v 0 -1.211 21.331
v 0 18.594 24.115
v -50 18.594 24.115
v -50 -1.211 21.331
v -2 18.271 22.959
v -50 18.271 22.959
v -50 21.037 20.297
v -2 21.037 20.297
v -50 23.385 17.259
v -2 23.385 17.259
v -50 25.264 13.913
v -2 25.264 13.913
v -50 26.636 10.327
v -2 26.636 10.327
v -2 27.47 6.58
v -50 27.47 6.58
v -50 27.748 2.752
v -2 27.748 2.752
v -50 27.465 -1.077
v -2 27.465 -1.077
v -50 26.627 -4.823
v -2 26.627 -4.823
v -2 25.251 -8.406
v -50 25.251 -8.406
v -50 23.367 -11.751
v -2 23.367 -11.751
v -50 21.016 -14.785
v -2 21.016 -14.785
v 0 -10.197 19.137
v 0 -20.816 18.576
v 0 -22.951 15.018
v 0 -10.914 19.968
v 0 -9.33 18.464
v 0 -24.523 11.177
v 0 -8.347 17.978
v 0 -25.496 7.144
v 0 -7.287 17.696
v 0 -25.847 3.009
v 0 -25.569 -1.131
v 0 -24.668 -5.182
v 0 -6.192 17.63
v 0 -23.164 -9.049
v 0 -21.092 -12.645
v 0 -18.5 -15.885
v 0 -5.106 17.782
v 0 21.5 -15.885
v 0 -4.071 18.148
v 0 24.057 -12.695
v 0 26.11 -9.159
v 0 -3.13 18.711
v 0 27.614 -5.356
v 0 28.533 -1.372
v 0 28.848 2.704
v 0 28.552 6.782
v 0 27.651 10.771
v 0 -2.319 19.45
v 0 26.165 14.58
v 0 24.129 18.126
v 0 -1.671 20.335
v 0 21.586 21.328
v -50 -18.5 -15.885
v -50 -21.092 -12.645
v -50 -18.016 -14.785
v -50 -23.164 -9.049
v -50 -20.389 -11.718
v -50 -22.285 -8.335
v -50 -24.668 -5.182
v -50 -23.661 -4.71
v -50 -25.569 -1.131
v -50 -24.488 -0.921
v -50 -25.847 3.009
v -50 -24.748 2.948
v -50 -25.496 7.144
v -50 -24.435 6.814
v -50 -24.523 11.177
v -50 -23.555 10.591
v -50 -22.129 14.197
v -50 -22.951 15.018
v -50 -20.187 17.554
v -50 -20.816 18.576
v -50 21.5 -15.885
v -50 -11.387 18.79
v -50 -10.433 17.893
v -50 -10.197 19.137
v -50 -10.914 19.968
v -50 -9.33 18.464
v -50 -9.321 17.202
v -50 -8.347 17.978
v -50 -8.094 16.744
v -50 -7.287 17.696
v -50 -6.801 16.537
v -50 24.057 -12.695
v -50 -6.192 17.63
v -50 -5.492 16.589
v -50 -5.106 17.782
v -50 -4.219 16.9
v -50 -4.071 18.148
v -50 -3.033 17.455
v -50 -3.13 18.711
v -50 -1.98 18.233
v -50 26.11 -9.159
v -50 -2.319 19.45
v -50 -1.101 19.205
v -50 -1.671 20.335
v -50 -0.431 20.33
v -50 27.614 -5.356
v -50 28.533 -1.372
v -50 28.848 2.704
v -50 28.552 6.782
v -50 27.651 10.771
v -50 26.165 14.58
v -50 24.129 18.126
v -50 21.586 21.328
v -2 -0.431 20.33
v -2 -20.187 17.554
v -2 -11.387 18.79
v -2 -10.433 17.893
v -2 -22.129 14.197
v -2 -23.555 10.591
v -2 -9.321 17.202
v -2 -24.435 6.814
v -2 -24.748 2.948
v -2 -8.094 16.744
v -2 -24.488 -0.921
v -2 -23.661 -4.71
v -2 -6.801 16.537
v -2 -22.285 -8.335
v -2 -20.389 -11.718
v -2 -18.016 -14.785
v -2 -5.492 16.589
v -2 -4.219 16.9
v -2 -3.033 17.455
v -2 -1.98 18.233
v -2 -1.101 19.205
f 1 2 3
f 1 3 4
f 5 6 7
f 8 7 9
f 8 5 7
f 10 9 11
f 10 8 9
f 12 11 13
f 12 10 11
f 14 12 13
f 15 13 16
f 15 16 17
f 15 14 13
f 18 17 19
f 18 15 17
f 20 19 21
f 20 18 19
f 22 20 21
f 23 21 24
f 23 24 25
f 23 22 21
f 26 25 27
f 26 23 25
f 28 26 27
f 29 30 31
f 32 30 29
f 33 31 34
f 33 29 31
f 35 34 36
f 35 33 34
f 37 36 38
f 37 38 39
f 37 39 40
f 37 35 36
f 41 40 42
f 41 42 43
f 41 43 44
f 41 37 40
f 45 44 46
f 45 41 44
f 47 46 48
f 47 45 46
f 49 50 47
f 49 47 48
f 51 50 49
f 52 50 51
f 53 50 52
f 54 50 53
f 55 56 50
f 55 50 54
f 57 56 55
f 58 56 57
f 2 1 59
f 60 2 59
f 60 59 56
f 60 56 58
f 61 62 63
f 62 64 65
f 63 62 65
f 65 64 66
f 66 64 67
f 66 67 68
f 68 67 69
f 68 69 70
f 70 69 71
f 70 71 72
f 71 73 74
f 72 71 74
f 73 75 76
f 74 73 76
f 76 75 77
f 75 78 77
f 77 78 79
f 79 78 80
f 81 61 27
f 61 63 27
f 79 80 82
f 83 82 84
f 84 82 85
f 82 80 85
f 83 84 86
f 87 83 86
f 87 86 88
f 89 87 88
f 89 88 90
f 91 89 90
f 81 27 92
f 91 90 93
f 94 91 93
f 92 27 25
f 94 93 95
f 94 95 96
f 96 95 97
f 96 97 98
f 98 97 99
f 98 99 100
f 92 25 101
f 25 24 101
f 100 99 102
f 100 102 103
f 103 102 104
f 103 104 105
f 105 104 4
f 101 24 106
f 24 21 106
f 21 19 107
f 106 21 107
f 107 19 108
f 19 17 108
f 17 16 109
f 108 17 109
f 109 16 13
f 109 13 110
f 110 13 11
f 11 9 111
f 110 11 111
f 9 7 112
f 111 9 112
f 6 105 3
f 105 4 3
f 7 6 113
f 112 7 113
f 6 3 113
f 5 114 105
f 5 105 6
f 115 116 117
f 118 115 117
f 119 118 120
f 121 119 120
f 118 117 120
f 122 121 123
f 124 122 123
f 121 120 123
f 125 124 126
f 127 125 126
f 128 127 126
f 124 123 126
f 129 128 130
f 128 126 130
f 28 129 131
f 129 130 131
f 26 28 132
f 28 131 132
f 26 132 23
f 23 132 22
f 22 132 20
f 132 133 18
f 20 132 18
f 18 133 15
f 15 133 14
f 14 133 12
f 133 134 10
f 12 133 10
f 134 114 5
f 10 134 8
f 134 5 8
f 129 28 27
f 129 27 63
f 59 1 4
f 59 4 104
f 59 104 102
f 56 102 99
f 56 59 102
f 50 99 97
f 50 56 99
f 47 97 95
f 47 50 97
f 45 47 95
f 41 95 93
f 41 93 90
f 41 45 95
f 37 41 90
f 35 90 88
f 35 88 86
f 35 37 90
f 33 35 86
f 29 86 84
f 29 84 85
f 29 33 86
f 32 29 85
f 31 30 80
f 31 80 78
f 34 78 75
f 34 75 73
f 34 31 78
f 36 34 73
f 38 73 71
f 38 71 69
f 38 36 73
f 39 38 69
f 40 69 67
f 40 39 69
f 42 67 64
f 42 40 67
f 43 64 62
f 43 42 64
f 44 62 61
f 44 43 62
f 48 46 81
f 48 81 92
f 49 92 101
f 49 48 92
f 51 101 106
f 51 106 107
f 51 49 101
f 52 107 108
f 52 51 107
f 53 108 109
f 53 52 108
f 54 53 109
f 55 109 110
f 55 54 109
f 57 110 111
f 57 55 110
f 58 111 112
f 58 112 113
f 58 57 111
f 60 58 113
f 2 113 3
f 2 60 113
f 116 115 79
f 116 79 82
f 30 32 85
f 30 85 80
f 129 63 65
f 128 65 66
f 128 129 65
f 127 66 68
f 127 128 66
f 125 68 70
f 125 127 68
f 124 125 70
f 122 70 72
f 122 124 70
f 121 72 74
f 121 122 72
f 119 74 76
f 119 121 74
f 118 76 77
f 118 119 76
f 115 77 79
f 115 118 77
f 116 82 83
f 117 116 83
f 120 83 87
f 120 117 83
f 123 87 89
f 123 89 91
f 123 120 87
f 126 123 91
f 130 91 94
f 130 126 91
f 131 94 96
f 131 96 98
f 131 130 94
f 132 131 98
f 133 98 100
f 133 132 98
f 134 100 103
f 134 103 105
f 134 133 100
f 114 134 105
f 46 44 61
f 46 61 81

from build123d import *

# Parameters (mm, degrees)
F1_DEPTH = 50
F2_DEPTH = 2


with BuildPart() as f1:
    # F0 (on Right) → F1 (new body)
    with BuildSketch(Plane.YZ):
        with BuildLine():
            Line((-18.500151, -15.885202), (21.499849, -15.885202))
            ThreePointArc((21.499849, -15.885202), (28.776178, 4.748888), (18.594223, 24.114798))
            Line((18.594223, 24.114798), (-1.211139, 21.331336))
            ThreePointArc((-1.211139, 21.331336), (-5.644923, 17.678725), (-10.913745, 19.967723))
            Line((-10.913745, 19.967723), (-20.816425, 18.575992))
            ThreePointArc((-20.816425, 18.575992), (-25.786783, 0.933475), (-18.500151, -15.885202))
        make_face()
        with BuildLine():
            ThreePointArc((-18.016041, -14.785202), (-24.689377, 1.008996), (-20.187486, 17.553574))
            Line((-20.187486, 17.553574), (-11.387244, 18.790367))
            ThreePointArc((-11.387244, 18.790367), (-5.491832, 16.589431), (-0.431459, 20.330102))
            Line((-0.431459, 20.330102), (18.271464, 22.958627))
            ThreePointArc((18.271464, 22.958627), (27.678942, 4.670945), (21.015738, -14.785202))
            Line((21.015738, -14.785202), (-18.016041, -14.785202))
        make_face(mode=Mode.SUBTRACT)
    extrude(amount=-F1_DEPTH)

    # F0 (on Right) → F2 (join)
    with BuildSketch(Plane.YZ):
        with BuildLine():
            Line((-11.387244, 18.790367), (-20.187486, 17.553574))
            ThreePointArc((-20.187486, 17.553574), (-24.689377, 1.008996), (-18.016041, -14.785202))
            Line((-18.016041, -14.785202), (21.015738, -14.785202))
            ThreePointArc((21.015738, -14.785202), (27.678942, 4.670945), (18.271464, 22.958627))
            Line((18.271464, 22.958627), (-0.431459, 20.330102))
            ThreePointArc((-0.431459, 20.330102), (-5.491832, 16.589431), (-11.387244, 18.790367))
        make_face()
    extrude(amount=-F2_DEPTH)


solid = f1.part
